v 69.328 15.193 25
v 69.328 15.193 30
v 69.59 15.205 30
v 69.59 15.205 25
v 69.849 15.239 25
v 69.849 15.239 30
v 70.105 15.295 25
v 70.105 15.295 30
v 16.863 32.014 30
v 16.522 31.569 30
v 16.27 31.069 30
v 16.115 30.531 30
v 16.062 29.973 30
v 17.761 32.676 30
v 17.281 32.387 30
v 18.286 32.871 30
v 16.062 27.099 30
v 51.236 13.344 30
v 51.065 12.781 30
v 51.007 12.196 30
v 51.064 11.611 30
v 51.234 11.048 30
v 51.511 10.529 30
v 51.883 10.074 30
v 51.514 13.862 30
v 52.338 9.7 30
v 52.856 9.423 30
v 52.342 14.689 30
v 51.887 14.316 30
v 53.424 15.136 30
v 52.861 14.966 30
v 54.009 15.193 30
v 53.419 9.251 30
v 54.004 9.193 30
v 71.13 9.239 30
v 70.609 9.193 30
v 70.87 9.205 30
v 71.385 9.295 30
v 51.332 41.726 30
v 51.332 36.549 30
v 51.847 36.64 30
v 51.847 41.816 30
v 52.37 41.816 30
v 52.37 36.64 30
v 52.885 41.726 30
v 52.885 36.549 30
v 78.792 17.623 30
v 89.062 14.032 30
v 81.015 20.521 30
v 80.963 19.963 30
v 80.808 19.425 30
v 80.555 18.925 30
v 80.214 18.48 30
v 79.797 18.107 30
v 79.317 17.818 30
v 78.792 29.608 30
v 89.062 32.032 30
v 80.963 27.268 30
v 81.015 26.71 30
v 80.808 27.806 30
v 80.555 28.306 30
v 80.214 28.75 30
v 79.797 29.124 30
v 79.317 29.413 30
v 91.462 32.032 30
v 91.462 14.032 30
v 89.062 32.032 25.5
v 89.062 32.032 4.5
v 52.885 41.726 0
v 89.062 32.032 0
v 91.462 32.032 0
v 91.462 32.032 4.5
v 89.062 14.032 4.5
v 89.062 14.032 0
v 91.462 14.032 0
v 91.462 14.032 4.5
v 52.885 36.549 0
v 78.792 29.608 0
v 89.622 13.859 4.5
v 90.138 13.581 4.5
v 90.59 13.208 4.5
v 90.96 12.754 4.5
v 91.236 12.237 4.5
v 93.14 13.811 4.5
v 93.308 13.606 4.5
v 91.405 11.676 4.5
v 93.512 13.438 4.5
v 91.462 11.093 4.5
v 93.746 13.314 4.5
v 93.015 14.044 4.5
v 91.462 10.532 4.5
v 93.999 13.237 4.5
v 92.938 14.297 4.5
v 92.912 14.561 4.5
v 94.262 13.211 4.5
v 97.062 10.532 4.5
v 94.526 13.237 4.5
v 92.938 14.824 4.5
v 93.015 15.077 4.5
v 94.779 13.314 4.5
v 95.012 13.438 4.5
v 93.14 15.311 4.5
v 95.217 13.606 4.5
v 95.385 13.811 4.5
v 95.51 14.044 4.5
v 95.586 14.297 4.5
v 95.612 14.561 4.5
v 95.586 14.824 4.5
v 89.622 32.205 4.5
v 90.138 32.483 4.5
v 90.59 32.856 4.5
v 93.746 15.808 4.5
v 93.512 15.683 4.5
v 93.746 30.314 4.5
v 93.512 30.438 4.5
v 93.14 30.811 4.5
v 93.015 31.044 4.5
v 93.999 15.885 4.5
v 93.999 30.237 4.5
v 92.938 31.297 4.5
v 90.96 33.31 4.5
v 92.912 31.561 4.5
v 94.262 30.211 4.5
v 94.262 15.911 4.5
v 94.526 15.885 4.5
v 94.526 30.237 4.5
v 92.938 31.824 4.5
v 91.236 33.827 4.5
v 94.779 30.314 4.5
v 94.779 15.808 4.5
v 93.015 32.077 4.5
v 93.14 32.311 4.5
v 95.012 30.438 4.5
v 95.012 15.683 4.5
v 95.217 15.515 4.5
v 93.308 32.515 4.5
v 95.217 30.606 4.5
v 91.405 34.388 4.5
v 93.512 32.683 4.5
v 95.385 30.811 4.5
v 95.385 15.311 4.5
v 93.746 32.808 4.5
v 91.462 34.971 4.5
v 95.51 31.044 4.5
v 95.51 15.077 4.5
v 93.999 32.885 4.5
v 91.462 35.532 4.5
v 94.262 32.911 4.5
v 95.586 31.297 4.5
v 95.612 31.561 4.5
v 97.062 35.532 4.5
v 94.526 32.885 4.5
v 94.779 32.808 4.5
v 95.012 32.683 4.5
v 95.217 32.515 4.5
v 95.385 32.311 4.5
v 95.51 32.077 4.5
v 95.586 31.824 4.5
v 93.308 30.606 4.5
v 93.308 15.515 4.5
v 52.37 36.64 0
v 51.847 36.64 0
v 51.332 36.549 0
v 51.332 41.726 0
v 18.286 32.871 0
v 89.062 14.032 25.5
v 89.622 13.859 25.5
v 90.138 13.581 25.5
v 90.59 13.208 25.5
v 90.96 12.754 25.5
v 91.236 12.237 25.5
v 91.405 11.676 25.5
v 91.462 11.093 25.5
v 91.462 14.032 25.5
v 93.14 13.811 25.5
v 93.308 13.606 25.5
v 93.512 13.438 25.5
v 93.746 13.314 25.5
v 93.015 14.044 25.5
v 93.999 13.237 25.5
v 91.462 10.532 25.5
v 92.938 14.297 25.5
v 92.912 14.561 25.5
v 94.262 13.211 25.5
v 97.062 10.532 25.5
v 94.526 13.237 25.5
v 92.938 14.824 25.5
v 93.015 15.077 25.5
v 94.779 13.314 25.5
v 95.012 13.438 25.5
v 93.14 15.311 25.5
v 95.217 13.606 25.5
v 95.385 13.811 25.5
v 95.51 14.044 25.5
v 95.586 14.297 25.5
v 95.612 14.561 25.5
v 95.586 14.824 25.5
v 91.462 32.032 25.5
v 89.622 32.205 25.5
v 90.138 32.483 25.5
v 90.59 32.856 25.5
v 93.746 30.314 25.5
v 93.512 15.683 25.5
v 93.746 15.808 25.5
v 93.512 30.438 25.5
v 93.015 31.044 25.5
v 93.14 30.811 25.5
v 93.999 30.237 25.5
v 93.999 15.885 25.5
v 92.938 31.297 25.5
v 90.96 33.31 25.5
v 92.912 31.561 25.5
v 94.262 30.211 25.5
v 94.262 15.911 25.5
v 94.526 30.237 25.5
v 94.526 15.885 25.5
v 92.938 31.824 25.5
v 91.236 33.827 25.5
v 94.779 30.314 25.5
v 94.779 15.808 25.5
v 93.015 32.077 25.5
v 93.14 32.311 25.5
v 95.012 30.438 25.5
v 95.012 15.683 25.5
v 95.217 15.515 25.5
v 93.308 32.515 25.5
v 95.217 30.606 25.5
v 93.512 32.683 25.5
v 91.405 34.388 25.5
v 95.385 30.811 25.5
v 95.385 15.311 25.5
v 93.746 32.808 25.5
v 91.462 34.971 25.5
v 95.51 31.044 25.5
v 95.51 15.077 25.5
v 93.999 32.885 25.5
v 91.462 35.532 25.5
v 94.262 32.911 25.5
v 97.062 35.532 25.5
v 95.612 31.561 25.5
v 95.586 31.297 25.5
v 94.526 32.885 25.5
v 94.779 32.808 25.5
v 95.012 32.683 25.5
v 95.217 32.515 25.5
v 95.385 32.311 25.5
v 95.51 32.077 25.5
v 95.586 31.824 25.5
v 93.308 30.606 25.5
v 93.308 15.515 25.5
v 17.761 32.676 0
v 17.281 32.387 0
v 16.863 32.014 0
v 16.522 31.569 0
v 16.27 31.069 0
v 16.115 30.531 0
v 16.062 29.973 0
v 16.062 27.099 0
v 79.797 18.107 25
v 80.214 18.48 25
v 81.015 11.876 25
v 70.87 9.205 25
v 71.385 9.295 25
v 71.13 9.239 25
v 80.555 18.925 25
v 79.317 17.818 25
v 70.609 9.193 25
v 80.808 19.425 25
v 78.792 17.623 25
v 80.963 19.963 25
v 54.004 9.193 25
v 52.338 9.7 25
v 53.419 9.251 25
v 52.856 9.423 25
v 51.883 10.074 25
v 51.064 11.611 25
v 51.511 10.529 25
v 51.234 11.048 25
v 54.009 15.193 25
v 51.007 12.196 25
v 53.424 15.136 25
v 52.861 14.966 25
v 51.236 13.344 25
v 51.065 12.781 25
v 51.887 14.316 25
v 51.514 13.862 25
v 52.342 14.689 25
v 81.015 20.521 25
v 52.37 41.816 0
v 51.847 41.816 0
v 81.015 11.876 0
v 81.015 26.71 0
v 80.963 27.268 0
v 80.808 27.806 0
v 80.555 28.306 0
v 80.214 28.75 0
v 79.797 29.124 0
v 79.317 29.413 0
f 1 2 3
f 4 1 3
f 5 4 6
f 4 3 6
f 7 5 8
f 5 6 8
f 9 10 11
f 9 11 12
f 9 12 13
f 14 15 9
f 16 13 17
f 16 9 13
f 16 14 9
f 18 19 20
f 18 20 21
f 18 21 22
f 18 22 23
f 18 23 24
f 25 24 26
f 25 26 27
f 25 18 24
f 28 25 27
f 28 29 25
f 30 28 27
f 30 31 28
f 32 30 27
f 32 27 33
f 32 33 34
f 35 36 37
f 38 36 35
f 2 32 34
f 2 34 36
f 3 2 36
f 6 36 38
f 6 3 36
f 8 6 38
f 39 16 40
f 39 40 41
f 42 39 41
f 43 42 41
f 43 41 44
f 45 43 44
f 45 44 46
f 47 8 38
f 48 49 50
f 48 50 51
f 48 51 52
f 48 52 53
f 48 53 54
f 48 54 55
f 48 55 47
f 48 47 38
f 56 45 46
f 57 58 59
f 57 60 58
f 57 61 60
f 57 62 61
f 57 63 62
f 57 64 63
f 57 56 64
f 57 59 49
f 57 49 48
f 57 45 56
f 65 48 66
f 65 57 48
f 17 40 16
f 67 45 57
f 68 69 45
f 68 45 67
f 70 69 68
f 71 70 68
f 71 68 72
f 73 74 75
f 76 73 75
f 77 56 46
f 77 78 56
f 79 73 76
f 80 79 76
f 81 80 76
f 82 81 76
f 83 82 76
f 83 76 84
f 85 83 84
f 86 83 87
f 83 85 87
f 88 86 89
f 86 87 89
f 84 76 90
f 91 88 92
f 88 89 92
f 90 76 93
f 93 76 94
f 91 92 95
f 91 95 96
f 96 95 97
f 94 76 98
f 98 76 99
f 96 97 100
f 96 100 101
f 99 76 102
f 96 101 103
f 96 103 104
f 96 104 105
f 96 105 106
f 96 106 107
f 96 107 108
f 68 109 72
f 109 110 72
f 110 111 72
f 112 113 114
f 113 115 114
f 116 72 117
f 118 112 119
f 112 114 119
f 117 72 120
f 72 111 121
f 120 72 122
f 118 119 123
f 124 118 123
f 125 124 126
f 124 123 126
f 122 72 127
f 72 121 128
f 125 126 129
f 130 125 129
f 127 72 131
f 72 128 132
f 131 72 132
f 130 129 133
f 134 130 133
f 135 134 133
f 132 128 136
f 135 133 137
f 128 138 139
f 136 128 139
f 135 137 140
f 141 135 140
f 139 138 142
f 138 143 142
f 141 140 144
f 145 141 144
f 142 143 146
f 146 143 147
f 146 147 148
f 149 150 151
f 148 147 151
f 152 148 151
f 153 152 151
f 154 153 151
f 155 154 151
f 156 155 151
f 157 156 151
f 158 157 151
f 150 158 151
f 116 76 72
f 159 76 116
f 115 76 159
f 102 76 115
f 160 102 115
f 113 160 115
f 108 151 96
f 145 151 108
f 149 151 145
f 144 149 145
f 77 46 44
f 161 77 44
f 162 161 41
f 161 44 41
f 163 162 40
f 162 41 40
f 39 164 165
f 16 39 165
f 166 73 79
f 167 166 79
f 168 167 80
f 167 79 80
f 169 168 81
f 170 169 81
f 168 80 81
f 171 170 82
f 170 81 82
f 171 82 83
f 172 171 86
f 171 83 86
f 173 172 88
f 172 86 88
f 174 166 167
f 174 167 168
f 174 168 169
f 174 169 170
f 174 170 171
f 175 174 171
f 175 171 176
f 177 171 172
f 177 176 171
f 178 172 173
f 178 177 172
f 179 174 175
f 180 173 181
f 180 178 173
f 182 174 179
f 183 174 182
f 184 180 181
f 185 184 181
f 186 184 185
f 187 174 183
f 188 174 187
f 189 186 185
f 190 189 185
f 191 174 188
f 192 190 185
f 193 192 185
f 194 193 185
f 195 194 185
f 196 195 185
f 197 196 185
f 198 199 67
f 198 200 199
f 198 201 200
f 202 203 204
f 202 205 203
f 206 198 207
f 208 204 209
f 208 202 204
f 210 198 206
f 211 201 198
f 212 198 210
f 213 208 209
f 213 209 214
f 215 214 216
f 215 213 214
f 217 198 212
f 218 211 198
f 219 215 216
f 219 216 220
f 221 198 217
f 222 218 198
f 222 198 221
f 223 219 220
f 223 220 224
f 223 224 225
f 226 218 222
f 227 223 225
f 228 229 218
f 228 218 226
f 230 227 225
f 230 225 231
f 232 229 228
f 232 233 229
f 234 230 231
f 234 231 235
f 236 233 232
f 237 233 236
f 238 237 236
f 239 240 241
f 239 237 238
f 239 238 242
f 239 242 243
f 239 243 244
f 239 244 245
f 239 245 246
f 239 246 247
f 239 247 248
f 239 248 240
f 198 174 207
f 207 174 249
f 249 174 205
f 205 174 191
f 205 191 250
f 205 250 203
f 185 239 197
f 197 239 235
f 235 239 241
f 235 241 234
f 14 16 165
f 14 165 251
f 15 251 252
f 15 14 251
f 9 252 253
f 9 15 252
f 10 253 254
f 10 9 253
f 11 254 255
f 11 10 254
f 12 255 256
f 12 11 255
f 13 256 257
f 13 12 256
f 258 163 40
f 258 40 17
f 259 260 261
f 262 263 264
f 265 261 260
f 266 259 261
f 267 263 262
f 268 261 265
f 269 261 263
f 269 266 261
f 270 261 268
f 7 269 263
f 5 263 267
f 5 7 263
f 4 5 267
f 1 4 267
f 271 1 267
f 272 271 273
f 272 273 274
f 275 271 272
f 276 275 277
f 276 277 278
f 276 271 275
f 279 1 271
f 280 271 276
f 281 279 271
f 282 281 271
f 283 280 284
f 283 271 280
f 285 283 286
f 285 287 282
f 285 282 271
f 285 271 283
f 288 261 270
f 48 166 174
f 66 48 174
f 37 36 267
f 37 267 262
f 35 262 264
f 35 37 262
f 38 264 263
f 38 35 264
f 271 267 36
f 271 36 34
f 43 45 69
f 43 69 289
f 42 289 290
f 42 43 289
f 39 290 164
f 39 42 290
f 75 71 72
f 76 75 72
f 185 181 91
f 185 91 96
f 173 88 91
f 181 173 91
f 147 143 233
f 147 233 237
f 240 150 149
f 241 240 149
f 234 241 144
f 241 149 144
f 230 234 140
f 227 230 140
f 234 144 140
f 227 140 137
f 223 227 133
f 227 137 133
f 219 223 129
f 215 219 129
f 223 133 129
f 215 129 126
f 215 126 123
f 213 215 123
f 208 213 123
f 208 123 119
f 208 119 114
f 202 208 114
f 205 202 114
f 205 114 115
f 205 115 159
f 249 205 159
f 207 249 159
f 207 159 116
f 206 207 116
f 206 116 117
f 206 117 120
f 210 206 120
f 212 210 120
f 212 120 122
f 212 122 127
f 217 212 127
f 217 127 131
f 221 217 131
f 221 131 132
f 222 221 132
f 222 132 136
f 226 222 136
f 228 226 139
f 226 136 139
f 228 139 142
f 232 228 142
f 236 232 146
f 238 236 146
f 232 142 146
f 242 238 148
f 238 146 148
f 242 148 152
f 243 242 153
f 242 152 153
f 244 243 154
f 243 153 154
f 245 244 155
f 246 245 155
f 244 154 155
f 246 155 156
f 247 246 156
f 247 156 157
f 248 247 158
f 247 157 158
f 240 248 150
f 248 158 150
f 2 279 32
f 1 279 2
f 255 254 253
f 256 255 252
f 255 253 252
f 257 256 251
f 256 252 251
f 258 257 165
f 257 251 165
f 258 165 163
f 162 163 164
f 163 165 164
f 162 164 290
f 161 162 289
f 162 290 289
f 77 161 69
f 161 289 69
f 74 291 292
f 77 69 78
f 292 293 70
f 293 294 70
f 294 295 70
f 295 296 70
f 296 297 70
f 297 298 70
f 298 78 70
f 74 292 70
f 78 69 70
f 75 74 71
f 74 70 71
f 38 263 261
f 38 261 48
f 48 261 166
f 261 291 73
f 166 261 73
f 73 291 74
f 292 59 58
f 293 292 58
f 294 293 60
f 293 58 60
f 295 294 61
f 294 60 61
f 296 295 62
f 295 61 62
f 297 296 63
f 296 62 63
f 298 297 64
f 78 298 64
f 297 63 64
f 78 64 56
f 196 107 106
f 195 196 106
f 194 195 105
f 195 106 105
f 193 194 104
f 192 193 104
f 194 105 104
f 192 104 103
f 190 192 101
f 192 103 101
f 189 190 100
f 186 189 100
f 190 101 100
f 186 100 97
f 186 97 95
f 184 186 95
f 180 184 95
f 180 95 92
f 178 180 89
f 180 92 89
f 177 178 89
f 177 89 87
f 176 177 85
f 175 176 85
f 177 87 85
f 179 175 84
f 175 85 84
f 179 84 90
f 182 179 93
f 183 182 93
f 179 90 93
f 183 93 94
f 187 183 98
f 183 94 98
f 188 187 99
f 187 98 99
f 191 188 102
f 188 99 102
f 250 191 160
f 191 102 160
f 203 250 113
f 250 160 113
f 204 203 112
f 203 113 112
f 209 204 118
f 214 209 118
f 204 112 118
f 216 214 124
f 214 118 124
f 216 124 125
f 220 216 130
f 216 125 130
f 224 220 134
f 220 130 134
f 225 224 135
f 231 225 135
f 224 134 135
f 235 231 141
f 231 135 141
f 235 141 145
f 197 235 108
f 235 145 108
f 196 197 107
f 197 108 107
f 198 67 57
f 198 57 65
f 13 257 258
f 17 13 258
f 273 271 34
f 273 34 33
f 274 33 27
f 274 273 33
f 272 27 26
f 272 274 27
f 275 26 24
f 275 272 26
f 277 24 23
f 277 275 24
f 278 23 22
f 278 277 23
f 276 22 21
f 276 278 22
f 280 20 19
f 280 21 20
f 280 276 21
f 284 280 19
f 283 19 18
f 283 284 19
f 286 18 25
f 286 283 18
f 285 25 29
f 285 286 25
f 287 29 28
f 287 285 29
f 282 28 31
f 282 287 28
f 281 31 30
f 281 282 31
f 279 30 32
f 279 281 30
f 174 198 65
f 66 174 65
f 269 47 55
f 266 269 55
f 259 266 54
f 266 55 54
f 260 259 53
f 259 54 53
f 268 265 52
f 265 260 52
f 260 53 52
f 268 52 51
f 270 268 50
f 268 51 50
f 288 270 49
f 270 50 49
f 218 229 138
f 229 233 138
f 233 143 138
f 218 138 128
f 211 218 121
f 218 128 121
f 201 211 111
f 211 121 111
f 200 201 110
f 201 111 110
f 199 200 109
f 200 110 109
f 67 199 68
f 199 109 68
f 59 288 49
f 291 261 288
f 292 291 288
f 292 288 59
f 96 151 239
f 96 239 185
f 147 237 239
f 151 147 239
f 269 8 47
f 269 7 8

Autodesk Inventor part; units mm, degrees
ref_plane "YZ Plane" through (0, 0, 0) normal (1, 0, 0) x (0, 1, 0)
ref_plane "XZ Plane" through (0, 0, 0) normal (0, 1, 0) x (-1, 0, 0)
ref_plane "XY Plane" through (0, 0, 0) normal (0, 0, 1) x (1, 0, 0)
sketch "Sketch1" plane through (0, 0, 0) normal (0, 0, 1) x (1, 0, 0)
  line L0 (52.1089, 41.9337) -> (16.0623, 32.275)
  line L1 (81.0151, 18.2189) -> (81.0151, 29.0119)
  line L2 (81.0151, 29.0119) -> (52.1089, 36.7573)
  line L3 (52.1089, 36.7573) -> (16.0623, 27.0986)
  line L4 (16.0623, 32.275) -> (16.0623, 27.0986)
  line L5 (71.0038, 9.1932) -> (89.0623, 14.032)
  line L6 (71.0038, 9.1932) -> (54.0038, 9.1932)
  line L7 (54.0092, 15.1932) -> (69.7233, 15.1932)
  arc A0 (54.0092, 15.1932) -> (54.0038, 9.1932) centre (54.0065, 12.1932) ccw
  line L8 (69.7233, 15.1932) -> (81.0151, 18.2189)
  line L9 (52.1089, 41.9337) -> (89.0623, 32.032)
  line L10 (97.0623, 35.532) -> (97.0623, 10.532)
  circle A1 centre (94.2623, 31.5608) radius 1.35 projected
  circle A2 centre (94.2623, 14.5608) radius 1.35 projected
  line L11 (89.0623, 32.032) -> (91.4623, 32.032)
  line L12 (91.4623, 32.032) -> (91.4623, 35.532)
  line L13 (91.4623, 35.532) -> (97.0623, 35.532)
  line L14 (89.0623, 14.032) -> (91.4623, 14.032)
  line L15 (91.4623, 14.032) -> (91.4623, 10.532)
  line L16 (91.4623, 10.532) -> (97.0623, 10.532)
  point P0 (0, 0)
  dimension "d0" = 5
  dimension "d1" = 6
  dimension "d2" = 5
  dimension "d3" = 75
  dimension "d4" = 150
  dimension "d5" = 18
  dimension "d6" = 15
  dimension "d28" = 25
  dimension "d30" = 5.6
  dimension "d31" = 5.6
extrude "Extrusion1" add sketch "Sketch1" along normal blind 30
sketch "Sketch3" plane through (0, 0, 0) normal (0, 0, -1) x (-1, 0, 0)
  line L0 (-81.0151, 18.2189) -> (-46.6558, 18.2189)
  line L1 (-46.6558, 18.2189) -> (-46.6558, 4.635)
  line L2 (-46.6558, 4.635) -> (-81.0151, 4.635)
  line L3 (-81.0151, 4.635) -> (-81.0151, 18.2189)
  point P0 (0, 0)
extrude "Extrusion2" cut sketch "Sketch3" against normal blind 25
fillet "Fillet1" radius 3 7 edges at (81.0151, 29.0119, 15) (81.0151, 18.2189, 27.5) (69.7233, 15.1932, 27.5) (52.1089, 36.7573, 15) (52.1089, 41.9337, 15) (16.0623, 32.275, 15) (71.0038, 9.1932, 27.5)
sketch "Sketch6" plane through (91.4623, 35.532, 0) normal (0, 1, 0) x (1, 0, 0)
  line L0 (0, 0) -> (0, -30) projected
  line L1 (5.6, 0) -> (0, 0)
  line L2 (0, 0) -> (0, -4.5)
  line L3 (0, -4.5) -> (5.6, -4.5)
  line L4 (5.6, -4.5) -> (5.6, 0)
  line L5 (5.6, -30) -> (0, -30)
  line L6 (0, -30) -> (0, -25.5)
  line L7 (0, -25.5) -> (5.6, -25.5)
  line L8 (5.6, -25.5) -> (5.6, -30)
  point P0 (-91.4623, 0)
  dimension "d32" = 4.5
  dimension "d33" = 5.6
  dimension "d34" = 4.5
extrude "Extrusion5" cut sketch "Sketch6" against normal through all
fillet "Fillet2" radius 3 2 edges at (91.4623, 32.032, 15) (91.4623, 14.032, 15)
properties part number "Right Hand" material "Aluminum-6061"
